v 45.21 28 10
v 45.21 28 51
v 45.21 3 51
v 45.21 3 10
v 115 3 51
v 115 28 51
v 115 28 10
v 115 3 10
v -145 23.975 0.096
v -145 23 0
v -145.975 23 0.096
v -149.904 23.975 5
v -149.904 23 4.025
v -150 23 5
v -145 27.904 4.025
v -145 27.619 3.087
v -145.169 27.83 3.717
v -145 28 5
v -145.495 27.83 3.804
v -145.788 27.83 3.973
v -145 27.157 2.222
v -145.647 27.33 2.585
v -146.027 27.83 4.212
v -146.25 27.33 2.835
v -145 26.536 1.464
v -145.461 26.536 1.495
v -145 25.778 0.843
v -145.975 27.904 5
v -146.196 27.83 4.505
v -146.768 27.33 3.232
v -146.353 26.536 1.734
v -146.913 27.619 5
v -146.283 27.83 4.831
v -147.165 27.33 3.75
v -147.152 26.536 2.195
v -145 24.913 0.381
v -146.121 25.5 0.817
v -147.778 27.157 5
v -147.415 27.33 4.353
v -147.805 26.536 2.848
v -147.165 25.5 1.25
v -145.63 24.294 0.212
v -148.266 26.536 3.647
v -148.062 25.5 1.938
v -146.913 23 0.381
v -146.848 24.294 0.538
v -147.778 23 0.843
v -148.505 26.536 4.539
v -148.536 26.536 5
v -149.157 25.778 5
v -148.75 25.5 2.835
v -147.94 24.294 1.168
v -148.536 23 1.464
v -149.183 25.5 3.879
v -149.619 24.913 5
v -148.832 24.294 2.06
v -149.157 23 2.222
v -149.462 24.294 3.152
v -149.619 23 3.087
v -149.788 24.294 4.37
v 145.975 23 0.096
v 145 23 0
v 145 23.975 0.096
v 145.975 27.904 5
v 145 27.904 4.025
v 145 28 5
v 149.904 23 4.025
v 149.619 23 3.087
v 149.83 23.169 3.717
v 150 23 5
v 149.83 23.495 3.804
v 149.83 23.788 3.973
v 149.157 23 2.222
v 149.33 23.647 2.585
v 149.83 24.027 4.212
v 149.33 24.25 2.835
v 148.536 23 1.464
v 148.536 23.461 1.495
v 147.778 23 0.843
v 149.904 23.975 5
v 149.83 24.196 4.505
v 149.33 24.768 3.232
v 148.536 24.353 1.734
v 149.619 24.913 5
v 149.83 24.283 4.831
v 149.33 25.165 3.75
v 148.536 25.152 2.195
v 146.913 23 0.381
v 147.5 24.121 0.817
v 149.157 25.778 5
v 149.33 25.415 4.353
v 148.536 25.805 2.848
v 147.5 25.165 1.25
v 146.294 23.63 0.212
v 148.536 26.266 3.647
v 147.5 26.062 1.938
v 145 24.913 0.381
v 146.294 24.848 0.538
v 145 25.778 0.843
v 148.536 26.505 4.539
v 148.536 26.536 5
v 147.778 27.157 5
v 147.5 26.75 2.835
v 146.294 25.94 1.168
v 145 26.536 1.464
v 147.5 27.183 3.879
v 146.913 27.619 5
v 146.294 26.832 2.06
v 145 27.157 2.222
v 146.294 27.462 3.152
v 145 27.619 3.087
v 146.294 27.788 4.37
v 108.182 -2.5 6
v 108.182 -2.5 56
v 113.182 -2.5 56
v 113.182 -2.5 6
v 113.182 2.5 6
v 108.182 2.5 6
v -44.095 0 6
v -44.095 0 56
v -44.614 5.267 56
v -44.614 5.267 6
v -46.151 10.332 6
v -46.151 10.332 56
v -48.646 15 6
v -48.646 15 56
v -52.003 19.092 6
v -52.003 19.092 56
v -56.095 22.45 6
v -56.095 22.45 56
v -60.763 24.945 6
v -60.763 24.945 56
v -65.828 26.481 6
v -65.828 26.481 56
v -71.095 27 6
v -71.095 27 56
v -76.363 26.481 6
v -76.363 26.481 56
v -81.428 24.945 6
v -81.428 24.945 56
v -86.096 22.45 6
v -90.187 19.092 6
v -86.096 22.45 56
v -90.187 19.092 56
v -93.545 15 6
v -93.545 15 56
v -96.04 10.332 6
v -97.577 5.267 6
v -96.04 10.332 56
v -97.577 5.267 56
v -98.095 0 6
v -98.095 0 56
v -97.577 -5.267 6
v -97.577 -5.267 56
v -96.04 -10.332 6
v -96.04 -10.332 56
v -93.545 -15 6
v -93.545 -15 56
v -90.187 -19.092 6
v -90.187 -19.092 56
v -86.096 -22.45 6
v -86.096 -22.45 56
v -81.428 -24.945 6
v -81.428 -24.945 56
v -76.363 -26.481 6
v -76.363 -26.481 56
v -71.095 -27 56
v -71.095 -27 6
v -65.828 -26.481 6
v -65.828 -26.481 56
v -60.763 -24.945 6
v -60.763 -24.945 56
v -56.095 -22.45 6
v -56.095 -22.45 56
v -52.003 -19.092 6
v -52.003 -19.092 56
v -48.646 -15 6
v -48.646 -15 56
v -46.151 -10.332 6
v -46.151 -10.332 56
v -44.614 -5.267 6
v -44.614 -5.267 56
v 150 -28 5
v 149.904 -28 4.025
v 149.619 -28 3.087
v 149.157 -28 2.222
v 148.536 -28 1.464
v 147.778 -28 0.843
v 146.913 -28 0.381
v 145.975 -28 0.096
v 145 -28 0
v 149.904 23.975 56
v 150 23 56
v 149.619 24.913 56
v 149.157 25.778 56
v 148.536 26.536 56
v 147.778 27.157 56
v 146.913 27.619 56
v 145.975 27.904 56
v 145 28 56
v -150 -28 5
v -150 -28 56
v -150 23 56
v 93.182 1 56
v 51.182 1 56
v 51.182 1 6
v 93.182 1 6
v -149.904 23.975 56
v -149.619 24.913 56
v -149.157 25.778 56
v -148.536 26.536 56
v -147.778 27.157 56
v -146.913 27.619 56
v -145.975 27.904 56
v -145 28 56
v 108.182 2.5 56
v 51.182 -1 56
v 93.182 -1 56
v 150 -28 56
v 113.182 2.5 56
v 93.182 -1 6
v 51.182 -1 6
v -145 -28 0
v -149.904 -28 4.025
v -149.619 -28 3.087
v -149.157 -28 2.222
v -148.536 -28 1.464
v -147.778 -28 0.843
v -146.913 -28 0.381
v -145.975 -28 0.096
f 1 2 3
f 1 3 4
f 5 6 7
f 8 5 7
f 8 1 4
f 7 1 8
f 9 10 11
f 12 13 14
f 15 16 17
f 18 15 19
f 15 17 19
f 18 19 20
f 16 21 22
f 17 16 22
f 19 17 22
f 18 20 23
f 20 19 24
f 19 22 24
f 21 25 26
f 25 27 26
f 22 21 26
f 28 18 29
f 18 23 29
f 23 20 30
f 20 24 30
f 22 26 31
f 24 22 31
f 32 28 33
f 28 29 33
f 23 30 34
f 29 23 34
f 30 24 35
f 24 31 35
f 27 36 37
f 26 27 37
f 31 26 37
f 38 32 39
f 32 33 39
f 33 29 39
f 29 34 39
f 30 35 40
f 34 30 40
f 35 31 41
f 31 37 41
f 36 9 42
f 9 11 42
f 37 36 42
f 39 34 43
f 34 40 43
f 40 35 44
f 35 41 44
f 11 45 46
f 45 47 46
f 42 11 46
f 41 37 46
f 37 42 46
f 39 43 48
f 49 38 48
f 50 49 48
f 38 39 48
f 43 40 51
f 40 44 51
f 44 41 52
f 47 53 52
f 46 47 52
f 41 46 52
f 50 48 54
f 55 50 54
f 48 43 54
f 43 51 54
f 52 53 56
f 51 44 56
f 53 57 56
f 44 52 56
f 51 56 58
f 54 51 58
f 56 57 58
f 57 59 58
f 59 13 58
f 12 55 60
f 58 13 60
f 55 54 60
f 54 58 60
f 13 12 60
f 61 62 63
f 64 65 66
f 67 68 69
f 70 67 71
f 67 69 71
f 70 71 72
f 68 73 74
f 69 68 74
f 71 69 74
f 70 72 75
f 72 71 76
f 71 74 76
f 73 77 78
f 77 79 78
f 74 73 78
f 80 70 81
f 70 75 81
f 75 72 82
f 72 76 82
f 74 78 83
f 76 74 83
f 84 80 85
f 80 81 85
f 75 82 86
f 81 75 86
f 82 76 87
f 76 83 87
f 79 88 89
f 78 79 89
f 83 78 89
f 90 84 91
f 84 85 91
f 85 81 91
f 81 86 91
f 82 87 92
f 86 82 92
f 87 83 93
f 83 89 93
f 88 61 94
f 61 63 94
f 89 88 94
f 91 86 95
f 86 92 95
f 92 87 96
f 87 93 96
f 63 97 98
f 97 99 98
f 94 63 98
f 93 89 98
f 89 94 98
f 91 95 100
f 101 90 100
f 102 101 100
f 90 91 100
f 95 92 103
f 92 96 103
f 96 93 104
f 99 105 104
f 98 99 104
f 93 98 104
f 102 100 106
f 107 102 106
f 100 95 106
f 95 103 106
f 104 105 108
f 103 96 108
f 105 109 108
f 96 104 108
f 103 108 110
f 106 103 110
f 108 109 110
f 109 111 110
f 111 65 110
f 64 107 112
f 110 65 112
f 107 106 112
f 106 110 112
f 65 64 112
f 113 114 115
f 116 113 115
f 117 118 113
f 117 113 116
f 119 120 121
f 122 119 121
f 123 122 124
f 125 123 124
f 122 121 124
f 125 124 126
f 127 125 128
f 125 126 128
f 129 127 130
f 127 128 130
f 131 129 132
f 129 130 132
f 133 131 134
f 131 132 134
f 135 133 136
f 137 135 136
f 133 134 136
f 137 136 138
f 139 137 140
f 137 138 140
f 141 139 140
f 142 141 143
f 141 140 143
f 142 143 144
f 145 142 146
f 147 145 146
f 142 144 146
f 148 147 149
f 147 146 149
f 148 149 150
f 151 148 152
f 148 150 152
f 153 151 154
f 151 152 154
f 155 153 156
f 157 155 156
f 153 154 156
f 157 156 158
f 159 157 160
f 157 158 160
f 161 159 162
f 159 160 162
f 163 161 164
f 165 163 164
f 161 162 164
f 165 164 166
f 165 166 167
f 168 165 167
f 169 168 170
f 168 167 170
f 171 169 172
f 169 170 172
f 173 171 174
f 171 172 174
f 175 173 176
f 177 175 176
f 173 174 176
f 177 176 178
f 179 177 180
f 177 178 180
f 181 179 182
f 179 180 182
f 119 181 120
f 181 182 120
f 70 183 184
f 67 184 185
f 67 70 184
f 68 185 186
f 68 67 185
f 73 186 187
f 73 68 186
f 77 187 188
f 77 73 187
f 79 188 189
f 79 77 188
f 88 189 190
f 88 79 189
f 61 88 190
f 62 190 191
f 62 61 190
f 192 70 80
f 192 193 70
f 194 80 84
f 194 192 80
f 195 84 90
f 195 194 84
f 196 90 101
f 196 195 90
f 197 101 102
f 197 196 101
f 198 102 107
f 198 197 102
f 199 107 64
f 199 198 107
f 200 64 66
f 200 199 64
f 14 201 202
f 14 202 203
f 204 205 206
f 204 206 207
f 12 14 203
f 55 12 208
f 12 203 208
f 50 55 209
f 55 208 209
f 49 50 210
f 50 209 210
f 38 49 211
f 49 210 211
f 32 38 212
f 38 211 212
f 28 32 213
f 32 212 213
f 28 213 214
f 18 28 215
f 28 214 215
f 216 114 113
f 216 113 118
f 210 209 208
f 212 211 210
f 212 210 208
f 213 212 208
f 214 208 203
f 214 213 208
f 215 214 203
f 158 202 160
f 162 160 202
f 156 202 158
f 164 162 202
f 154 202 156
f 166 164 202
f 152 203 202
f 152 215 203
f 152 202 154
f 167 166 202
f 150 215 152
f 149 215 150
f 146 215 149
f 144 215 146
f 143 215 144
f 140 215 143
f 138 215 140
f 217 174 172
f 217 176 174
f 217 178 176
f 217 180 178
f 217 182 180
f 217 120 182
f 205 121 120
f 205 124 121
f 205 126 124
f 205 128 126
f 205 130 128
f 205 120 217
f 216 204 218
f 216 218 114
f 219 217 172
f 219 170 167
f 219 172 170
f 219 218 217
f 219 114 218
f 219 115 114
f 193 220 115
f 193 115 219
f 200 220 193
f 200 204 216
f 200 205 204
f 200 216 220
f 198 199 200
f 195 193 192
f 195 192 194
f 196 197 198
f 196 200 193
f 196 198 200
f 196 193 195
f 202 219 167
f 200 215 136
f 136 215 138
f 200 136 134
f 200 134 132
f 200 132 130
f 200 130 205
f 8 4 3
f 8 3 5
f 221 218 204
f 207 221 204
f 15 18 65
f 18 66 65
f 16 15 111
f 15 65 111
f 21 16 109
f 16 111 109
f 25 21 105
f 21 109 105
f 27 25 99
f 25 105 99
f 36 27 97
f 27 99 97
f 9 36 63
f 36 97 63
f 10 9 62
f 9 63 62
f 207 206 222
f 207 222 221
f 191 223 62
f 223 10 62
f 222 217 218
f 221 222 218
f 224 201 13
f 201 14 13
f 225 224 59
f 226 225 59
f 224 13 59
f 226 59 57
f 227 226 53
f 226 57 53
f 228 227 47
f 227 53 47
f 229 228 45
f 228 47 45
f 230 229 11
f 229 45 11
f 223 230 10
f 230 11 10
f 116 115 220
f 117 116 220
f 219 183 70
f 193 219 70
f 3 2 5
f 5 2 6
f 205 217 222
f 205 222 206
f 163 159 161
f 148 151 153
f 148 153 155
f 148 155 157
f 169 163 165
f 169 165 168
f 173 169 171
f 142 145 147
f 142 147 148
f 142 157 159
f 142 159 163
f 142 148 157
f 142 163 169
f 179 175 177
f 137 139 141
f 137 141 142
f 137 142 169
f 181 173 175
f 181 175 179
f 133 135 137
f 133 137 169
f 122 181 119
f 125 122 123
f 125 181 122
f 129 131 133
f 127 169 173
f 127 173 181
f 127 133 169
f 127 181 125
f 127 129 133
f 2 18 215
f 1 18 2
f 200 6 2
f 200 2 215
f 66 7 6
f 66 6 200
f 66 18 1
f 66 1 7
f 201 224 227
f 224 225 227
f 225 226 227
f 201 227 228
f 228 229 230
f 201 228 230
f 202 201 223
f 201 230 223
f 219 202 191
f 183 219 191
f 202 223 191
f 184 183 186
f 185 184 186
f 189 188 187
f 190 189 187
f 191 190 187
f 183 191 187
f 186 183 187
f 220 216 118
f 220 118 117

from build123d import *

# Parameters (mm, degrees)
SKETCH1_W           = 300
SKETCH1_H           = 56
BOSS_EXTRUDE1_DEPTH = 56
FILLET1_R           = 5
SKETCH2_R           = 27
SKETCH2_W           = 42
SKETCH2_H           = 2
SKETCH2_W_2         = 5
SKETCH2_H_2         = 5
CUT_EXTRUDE1_DEPTH  = 50
SKETCH3_W           = 69.790407192
SKETCH3_H           = 41
CUT_EXTRUDE2_DEPTH  = 25


with BuildPart() as part:
    # Sketch1 → Boss-Extrude1 (new body)
    with BuildSketch(Plane.XY):
        Rectangle(SKETCH1_W, SKETCH1_H)
    extrude(amount=BOSS_EXTRUDE1_DEPTH)

    # Fillet1
    fillet1_edges = [part.edges().sort_by_distance(p)[0] for p in [
        (-150, 0, 0),
        (0, 28, 0),
        (150, 0, 0),
        (-150, 28, 28),
        (150, 28, 28),
    ]]
    fillet(fillet1_edges, radius=FILLET1_R)

    # Sketch2 → Cut-Extrude1 (cut)
    with BuildSketch(Plane.XY.offset(56)):
        with Locations((-71.095356244, 0)):
            Circle(SKETCH2_R)
        with Locations((72.182261243, 0)):
            Rectangle(SKETCH2_W, SKETCH2_H)
        with Locations((110.682261243, 0)):
            Rectangle(SKETCH2_W_2, SKETCH2_H_2)
    extrude(amount=-CUT_EXTRUDE1_DEPTH, mode=Mode.SUBTRACT)

    # Sketch3 → Cut-Extrude2 (cut)
    with BuildSketch(Plane(origin=(0, 28, 0), x_dir=(1, 0, 0), z_dir=(0, 1, 0))):
        with Locations((80.104796404, -30.5)):
            Rectangle(SKETCH3_W, SKETCH3_H)
    extrude(amount=-CUT_EXTRUDE2_DEPTH, mode=Mode.SUBTRACT)


solid = part.part
